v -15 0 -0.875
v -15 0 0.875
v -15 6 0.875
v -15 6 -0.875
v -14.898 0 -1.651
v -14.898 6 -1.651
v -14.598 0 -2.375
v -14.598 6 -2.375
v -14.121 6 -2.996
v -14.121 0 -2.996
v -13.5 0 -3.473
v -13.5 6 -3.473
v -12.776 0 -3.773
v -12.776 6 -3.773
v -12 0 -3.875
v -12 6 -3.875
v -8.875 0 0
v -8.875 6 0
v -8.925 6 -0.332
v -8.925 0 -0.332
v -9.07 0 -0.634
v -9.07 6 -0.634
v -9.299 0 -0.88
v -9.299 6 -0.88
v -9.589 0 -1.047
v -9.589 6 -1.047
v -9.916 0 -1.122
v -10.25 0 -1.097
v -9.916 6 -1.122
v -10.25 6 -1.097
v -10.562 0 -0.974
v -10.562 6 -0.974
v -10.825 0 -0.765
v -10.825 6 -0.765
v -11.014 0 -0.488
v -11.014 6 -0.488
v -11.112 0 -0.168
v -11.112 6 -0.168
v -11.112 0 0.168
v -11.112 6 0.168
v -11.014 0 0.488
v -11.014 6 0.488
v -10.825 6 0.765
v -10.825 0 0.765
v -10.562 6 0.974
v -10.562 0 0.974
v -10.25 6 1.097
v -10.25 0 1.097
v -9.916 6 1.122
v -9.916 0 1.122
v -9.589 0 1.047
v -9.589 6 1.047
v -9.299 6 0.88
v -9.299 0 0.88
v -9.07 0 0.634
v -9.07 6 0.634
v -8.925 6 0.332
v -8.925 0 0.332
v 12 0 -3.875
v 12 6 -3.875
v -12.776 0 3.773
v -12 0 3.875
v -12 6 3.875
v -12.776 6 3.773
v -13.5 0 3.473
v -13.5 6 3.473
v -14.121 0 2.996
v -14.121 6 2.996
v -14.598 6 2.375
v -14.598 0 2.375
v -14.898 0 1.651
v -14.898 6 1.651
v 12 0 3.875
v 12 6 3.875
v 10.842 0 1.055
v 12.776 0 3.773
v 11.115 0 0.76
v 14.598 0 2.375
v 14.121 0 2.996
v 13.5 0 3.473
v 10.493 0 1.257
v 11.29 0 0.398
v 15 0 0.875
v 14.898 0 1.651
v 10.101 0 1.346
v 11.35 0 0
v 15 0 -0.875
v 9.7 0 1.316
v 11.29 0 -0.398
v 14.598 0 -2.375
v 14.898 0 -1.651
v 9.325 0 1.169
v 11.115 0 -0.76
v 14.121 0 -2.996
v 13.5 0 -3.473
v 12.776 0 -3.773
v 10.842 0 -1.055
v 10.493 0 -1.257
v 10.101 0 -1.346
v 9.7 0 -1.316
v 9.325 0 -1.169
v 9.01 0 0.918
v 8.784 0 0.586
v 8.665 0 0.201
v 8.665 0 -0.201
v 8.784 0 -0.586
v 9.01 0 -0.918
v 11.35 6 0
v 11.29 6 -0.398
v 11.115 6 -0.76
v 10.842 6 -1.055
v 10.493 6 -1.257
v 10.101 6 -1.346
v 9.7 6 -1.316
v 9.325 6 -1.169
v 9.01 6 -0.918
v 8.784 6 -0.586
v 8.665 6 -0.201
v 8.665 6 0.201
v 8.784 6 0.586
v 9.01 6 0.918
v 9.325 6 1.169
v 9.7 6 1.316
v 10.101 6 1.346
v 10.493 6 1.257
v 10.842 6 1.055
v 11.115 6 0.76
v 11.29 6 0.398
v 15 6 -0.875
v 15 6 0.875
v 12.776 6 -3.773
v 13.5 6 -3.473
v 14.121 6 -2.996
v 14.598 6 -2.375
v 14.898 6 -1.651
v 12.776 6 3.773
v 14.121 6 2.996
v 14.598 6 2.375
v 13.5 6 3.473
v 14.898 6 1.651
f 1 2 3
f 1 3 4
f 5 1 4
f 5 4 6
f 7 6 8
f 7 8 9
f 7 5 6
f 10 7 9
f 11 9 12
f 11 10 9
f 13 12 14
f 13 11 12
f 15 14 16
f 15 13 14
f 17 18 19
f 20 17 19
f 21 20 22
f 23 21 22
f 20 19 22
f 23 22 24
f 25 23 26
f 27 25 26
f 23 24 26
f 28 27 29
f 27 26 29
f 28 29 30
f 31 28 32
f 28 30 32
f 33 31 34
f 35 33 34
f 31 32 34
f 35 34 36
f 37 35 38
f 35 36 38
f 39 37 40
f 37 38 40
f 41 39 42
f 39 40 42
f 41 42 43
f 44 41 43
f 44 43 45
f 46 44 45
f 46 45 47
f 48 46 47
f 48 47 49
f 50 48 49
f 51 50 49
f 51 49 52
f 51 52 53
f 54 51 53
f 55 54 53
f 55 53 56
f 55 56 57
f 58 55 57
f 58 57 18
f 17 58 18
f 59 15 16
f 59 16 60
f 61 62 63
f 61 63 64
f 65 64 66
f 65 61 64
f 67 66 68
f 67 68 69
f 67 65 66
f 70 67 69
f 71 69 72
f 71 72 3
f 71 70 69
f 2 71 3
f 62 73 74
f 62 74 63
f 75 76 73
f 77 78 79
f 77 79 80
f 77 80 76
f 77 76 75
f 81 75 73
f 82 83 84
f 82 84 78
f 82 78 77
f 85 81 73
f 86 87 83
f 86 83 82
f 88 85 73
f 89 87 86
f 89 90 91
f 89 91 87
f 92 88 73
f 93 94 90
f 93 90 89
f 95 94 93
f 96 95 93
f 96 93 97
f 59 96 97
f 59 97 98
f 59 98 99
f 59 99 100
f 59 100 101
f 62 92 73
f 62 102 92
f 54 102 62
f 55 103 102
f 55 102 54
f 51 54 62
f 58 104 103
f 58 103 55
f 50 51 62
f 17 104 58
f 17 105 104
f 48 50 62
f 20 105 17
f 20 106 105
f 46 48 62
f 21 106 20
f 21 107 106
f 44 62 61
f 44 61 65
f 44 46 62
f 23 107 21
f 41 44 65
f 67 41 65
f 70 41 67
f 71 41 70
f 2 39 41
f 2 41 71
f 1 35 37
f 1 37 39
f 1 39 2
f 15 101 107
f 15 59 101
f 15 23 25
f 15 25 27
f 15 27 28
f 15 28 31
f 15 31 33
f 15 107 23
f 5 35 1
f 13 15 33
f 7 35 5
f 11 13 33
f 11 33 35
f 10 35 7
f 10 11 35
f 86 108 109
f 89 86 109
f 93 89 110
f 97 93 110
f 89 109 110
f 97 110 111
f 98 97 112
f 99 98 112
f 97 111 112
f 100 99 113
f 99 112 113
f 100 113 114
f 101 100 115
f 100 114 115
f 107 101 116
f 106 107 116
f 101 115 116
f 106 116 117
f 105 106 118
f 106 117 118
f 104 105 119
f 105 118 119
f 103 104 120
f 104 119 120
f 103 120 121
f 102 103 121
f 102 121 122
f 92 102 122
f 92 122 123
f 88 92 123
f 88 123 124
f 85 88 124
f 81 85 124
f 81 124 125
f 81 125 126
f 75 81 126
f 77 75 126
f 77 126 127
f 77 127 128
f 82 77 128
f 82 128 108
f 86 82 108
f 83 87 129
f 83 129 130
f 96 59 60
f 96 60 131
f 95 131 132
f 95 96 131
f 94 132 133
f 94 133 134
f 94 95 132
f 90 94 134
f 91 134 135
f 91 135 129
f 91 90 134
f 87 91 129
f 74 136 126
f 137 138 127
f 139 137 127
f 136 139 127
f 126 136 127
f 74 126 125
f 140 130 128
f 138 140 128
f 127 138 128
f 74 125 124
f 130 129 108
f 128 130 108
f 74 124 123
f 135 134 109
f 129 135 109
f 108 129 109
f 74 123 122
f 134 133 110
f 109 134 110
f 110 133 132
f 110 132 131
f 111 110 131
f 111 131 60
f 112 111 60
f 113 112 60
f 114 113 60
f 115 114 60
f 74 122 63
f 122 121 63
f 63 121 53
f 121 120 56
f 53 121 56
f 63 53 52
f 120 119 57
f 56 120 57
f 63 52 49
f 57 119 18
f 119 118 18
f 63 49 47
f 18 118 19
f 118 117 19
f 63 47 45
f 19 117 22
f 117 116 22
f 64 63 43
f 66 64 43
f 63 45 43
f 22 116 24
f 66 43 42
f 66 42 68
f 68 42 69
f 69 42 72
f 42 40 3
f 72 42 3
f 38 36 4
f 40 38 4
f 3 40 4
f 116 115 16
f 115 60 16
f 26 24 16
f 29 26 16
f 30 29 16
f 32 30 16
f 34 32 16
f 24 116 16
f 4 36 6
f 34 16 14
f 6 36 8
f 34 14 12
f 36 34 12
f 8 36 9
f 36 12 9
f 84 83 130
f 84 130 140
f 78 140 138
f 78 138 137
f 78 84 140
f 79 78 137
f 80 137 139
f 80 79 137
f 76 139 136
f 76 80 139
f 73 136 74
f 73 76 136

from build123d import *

# Parameters (mm, degrees)
BOSS_EXTRUDE1_DEPTH = 6
SKETCH2_R           = 1.125
SKETCH2_R_2         = 1.35
CUT_EXTRUDE1_DEPTH  = 7


with BuildPart() as part:
    # Sketch1 → Boss-Extrude1 (new body)
    with BuildSketch(Plane(origin=(0, 0, 0), x_dir=(1, 0, 0), z_dir=(0, 1, 0))):
        with BuildLine():
            Line((-12, 3.875), (12, 3.875))
            ThreePointArc((12, 3.875), (14.121320344, 2.996320344), (15, 0.875))
            Line((15, 0.875), (15, -0.875))
            ThreePointArc((15, -0.875), (14.121320344, -2.996320344), (12, -3.875))
            Line((12, -3.875), (-12, -3.875))
            ThreePointArc((-12, -3.875), (-14.121320344, -2.996320344), (-15, -0.875))
            Line((-15, -0.875), (-15, 0.875))
            ThreePointArc((-15, 0.875), (-14.121320344, 2.996320344), (-12, 3.875))
        make_face()
    extrude(amount=BOSS_EXTRUDE1_DEPTH)

    # Sketch2 → Cut-Extrude1 (cut, through all)
    with BuildSketch(Plane(origin=(0, 6, 0), x_dir=(1, 0, 0), z_dir=(0, 1, 0))):
        with Locations((-10, 0)):
            Circle(SKETCH2_R)
        with Locations((10, 0)):
            Circle(SKETCH2_R_2)
    extrude(amount=-CUT_EXTRUDE1_DEPTH, mode=Mode.SUBTRACT)


solid = part.part
